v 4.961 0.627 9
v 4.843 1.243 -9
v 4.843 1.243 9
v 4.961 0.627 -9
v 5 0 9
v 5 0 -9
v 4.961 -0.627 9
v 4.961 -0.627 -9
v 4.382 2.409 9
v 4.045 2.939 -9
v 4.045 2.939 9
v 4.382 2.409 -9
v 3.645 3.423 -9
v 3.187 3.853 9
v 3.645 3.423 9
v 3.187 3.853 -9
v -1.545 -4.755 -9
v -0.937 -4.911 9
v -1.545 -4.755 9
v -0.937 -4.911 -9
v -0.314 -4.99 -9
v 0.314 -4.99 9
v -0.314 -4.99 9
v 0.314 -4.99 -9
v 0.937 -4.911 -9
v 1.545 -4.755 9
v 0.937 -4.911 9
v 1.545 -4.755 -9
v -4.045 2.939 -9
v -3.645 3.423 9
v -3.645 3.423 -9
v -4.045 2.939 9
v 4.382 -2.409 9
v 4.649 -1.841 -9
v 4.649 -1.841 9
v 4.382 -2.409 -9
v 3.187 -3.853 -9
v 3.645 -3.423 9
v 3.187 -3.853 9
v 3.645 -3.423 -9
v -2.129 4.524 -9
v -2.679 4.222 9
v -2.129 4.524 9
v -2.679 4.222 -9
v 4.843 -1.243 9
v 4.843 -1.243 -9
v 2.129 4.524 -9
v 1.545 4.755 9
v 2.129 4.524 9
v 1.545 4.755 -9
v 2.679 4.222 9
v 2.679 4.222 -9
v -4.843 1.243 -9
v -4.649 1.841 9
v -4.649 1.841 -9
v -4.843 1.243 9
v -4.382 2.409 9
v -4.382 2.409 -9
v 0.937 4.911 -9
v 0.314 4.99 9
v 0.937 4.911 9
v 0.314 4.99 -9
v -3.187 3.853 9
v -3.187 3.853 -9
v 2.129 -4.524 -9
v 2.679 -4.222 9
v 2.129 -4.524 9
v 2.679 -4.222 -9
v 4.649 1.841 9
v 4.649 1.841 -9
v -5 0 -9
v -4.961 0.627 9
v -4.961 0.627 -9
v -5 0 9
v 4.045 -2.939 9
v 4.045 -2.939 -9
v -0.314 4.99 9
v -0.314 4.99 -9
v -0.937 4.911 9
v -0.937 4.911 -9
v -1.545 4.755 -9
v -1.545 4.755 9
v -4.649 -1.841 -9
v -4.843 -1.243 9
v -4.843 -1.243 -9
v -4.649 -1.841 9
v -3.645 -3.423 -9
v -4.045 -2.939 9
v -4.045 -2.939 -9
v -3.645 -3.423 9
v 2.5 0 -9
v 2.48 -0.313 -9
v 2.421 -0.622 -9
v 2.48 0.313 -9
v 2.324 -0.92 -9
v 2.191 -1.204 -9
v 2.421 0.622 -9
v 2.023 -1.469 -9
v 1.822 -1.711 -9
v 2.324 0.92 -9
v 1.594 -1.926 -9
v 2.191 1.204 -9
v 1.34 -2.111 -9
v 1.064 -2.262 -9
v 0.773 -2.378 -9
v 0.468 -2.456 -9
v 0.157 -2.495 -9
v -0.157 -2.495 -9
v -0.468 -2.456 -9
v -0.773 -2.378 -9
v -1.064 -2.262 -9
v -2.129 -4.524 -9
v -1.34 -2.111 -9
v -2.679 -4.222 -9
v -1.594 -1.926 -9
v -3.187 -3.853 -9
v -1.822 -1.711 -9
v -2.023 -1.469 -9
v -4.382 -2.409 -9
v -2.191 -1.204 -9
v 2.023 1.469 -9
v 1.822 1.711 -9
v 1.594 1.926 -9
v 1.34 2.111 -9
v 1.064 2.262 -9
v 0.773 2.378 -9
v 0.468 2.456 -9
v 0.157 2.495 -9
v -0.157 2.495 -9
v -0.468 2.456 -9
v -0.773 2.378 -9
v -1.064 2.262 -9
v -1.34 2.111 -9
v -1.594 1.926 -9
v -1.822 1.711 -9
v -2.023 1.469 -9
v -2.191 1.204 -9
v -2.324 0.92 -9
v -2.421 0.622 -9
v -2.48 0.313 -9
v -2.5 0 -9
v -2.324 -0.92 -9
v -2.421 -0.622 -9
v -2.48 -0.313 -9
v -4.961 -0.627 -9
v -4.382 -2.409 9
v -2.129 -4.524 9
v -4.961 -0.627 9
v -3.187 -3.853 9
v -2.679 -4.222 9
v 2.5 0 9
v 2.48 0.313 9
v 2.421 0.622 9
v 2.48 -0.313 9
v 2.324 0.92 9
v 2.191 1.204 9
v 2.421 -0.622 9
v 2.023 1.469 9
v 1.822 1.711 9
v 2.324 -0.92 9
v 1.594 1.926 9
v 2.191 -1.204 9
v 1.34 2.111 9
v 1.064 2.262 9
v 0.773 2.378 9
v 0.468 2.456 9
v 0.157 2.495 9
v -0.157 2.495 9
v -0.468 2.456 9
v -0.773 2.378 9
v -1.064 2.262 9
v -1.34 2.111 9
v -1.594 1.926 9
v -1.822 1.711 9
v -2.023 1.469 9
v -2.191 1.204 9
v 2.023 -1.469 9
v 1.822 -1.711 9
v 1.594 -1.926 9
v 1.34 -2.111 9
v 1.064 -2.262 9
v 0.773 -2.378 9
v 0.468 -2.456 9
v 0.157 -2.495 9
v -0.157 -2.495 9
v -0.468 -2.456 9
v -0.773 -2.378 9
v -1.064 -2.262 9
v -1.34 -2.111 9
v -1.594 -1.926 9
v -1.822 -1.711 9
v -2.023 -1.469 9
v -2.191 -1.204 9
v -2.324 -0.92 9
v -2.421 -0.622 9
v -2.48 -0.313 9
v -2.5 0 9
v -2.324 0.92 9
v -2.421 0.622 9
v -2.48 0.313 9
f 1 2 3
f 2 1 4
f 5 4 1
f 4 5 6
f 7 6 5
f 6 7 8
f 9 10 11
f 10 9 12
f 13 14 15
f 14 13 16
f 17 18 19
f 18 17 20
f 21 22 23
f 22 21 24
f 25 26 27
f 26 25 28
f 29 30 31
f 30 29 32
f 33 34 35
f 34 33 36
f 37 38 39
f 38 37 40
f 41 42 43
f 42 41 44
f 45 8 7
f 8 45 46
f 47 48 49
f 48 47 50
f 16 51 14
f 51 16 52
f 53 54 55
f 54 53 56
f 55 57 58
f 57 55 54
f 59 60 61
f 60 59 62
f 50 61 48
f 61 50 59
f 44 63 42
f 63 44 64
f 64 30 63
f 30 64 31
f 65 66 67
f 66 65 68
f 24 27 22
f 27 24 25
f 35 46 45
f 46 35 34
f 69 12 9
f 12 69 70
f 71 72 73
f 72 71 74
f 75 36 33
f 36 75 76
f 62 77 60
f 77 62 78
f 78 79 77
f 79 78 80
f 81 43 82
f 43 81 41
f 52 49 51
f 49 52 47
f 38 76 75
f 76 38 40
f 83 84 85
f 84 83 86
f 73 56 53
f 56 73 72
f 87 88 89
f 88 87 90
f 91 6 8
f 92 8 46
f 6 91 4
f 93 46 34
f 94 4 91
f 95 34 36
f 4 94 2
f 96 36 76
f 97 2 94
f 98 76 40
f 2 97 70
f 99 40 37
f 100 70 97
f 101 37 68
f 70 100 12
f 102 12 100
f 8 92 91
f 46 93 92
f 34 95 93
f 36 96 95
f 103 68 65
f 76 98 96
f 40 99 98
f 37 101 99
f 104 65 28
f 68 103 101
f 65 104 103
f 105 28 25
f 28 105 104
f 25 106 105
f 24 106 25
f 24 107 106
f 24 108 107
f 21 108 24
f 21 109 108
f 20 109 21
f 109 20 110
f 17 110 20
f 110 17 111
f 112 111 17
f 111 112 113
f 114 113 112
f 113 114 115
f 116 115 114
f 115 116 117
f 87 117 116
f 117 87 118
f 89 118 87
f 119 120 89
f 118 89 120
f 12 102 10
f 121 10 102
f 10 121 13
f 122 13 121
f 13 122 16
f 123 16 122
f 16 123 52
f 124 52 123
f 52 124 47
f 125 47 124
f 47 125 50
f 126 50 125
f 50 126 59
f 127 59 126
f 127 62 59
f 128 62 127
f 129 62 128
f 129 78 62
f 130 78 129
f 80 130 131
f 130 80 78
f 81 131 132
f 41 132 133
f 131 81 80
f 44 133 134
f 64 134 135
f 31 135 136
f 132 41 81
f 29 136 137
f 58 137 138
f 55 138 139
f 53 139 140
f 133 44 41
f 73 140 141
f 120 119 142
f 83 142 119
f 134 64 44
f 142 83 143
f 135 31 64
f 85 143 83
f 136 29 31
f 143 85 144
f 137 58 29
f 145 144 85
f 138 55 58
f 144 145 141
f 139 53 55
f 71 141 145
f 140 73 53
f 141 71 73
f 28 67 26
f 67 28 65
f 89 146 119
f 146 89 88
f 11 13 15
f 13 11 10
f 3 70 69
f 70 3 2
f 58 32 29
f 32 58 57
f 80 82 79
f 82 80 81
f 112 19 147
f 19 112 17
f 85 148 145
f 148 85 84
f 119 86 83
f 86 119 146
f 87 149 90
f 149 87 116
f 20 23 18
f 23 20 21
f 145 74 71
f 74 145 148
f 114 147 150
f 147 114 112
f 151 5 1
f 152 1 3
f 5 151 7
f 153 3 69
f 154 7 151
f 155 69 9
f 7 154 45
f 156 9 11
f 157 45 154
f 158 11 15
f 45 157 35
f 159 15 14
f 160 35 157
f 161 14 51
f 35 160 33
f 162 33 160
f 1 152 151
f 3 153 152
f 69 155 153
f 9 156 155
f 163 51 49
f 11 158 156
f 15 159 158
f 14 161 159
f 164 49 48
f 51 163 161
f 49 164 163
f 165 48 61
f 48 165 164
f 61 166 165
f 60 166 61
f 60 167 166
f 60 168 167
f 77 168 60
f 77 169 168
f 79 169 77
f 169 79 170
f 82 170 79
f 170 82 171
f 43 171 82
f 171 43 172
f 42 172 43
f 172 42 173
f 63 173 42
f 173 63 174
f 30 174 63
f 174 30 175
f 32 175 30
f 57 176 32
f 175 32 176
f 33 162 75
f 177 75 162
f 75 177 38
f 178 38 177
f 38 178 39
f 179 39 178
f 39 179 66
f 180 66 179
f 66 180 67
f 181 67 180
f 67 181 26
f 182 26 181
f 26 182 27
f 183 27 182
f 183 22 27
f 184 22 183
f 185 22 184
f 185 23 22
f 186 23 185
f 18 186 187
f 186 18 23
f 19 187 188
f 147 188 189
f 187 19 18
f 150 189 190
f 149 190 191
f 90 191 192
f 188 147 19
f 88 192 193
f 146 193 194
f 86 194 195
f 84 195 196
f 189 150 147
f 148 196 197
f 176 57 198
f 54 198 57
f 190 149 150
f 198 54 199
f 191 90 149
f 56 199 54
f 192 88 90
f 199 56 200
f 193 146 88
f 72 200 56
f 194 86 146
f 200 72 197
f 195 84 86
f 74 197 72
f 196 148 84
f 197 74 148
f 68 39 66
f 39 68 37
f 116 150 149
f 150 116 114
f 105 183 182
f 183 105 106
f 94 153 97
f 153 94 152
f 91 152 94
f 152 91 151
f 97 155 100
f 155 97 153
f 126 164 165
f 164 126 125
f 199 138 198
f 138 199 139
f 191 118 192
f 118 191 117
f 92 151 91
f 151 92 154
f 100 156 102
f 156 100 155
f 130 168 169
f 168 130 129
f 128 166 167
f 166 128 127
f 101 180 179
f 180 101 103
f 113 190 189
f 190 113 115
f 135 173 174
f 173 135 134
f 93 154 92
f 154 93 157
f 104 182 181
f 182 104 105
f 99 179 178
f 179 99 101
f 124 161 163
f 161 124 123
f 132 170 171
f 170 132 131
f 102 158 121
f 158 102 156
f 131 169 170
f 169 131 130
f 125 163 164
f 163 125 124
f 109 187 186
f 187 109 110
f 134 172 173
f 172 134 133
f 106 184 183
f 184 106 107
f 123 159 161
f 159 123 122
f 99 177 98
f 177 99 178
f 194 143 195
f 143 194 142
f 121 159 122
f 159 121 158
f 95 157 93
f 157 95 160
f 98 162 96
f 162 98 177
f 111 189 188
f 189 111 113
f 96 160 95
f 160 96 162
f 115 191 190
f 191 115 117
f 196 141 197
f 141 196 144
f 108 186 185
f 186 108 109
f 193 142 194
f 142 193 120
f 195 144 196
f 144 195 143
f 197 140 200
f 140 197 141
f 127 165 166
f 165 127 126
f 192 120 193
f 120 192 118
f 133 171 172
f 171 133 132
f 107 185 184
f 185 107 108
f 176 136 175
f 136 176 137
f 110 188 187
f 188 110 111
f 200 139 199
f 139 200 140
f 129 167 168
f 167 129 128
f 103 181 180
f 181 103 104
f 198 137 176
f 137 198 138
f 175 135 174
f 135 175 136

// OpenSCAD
$fn = 50;


difference() {
	union() {
		translate(v = [0, 0, -9.0000000000]) {
			cylinder(h = 18, r = 5.0000000000);
		}
	}
	union() {
		translate(v = [0, 0, -100.0000000000]) {
			cylinder(h = 200, r = 2.5000000000);
		}
	}
}
